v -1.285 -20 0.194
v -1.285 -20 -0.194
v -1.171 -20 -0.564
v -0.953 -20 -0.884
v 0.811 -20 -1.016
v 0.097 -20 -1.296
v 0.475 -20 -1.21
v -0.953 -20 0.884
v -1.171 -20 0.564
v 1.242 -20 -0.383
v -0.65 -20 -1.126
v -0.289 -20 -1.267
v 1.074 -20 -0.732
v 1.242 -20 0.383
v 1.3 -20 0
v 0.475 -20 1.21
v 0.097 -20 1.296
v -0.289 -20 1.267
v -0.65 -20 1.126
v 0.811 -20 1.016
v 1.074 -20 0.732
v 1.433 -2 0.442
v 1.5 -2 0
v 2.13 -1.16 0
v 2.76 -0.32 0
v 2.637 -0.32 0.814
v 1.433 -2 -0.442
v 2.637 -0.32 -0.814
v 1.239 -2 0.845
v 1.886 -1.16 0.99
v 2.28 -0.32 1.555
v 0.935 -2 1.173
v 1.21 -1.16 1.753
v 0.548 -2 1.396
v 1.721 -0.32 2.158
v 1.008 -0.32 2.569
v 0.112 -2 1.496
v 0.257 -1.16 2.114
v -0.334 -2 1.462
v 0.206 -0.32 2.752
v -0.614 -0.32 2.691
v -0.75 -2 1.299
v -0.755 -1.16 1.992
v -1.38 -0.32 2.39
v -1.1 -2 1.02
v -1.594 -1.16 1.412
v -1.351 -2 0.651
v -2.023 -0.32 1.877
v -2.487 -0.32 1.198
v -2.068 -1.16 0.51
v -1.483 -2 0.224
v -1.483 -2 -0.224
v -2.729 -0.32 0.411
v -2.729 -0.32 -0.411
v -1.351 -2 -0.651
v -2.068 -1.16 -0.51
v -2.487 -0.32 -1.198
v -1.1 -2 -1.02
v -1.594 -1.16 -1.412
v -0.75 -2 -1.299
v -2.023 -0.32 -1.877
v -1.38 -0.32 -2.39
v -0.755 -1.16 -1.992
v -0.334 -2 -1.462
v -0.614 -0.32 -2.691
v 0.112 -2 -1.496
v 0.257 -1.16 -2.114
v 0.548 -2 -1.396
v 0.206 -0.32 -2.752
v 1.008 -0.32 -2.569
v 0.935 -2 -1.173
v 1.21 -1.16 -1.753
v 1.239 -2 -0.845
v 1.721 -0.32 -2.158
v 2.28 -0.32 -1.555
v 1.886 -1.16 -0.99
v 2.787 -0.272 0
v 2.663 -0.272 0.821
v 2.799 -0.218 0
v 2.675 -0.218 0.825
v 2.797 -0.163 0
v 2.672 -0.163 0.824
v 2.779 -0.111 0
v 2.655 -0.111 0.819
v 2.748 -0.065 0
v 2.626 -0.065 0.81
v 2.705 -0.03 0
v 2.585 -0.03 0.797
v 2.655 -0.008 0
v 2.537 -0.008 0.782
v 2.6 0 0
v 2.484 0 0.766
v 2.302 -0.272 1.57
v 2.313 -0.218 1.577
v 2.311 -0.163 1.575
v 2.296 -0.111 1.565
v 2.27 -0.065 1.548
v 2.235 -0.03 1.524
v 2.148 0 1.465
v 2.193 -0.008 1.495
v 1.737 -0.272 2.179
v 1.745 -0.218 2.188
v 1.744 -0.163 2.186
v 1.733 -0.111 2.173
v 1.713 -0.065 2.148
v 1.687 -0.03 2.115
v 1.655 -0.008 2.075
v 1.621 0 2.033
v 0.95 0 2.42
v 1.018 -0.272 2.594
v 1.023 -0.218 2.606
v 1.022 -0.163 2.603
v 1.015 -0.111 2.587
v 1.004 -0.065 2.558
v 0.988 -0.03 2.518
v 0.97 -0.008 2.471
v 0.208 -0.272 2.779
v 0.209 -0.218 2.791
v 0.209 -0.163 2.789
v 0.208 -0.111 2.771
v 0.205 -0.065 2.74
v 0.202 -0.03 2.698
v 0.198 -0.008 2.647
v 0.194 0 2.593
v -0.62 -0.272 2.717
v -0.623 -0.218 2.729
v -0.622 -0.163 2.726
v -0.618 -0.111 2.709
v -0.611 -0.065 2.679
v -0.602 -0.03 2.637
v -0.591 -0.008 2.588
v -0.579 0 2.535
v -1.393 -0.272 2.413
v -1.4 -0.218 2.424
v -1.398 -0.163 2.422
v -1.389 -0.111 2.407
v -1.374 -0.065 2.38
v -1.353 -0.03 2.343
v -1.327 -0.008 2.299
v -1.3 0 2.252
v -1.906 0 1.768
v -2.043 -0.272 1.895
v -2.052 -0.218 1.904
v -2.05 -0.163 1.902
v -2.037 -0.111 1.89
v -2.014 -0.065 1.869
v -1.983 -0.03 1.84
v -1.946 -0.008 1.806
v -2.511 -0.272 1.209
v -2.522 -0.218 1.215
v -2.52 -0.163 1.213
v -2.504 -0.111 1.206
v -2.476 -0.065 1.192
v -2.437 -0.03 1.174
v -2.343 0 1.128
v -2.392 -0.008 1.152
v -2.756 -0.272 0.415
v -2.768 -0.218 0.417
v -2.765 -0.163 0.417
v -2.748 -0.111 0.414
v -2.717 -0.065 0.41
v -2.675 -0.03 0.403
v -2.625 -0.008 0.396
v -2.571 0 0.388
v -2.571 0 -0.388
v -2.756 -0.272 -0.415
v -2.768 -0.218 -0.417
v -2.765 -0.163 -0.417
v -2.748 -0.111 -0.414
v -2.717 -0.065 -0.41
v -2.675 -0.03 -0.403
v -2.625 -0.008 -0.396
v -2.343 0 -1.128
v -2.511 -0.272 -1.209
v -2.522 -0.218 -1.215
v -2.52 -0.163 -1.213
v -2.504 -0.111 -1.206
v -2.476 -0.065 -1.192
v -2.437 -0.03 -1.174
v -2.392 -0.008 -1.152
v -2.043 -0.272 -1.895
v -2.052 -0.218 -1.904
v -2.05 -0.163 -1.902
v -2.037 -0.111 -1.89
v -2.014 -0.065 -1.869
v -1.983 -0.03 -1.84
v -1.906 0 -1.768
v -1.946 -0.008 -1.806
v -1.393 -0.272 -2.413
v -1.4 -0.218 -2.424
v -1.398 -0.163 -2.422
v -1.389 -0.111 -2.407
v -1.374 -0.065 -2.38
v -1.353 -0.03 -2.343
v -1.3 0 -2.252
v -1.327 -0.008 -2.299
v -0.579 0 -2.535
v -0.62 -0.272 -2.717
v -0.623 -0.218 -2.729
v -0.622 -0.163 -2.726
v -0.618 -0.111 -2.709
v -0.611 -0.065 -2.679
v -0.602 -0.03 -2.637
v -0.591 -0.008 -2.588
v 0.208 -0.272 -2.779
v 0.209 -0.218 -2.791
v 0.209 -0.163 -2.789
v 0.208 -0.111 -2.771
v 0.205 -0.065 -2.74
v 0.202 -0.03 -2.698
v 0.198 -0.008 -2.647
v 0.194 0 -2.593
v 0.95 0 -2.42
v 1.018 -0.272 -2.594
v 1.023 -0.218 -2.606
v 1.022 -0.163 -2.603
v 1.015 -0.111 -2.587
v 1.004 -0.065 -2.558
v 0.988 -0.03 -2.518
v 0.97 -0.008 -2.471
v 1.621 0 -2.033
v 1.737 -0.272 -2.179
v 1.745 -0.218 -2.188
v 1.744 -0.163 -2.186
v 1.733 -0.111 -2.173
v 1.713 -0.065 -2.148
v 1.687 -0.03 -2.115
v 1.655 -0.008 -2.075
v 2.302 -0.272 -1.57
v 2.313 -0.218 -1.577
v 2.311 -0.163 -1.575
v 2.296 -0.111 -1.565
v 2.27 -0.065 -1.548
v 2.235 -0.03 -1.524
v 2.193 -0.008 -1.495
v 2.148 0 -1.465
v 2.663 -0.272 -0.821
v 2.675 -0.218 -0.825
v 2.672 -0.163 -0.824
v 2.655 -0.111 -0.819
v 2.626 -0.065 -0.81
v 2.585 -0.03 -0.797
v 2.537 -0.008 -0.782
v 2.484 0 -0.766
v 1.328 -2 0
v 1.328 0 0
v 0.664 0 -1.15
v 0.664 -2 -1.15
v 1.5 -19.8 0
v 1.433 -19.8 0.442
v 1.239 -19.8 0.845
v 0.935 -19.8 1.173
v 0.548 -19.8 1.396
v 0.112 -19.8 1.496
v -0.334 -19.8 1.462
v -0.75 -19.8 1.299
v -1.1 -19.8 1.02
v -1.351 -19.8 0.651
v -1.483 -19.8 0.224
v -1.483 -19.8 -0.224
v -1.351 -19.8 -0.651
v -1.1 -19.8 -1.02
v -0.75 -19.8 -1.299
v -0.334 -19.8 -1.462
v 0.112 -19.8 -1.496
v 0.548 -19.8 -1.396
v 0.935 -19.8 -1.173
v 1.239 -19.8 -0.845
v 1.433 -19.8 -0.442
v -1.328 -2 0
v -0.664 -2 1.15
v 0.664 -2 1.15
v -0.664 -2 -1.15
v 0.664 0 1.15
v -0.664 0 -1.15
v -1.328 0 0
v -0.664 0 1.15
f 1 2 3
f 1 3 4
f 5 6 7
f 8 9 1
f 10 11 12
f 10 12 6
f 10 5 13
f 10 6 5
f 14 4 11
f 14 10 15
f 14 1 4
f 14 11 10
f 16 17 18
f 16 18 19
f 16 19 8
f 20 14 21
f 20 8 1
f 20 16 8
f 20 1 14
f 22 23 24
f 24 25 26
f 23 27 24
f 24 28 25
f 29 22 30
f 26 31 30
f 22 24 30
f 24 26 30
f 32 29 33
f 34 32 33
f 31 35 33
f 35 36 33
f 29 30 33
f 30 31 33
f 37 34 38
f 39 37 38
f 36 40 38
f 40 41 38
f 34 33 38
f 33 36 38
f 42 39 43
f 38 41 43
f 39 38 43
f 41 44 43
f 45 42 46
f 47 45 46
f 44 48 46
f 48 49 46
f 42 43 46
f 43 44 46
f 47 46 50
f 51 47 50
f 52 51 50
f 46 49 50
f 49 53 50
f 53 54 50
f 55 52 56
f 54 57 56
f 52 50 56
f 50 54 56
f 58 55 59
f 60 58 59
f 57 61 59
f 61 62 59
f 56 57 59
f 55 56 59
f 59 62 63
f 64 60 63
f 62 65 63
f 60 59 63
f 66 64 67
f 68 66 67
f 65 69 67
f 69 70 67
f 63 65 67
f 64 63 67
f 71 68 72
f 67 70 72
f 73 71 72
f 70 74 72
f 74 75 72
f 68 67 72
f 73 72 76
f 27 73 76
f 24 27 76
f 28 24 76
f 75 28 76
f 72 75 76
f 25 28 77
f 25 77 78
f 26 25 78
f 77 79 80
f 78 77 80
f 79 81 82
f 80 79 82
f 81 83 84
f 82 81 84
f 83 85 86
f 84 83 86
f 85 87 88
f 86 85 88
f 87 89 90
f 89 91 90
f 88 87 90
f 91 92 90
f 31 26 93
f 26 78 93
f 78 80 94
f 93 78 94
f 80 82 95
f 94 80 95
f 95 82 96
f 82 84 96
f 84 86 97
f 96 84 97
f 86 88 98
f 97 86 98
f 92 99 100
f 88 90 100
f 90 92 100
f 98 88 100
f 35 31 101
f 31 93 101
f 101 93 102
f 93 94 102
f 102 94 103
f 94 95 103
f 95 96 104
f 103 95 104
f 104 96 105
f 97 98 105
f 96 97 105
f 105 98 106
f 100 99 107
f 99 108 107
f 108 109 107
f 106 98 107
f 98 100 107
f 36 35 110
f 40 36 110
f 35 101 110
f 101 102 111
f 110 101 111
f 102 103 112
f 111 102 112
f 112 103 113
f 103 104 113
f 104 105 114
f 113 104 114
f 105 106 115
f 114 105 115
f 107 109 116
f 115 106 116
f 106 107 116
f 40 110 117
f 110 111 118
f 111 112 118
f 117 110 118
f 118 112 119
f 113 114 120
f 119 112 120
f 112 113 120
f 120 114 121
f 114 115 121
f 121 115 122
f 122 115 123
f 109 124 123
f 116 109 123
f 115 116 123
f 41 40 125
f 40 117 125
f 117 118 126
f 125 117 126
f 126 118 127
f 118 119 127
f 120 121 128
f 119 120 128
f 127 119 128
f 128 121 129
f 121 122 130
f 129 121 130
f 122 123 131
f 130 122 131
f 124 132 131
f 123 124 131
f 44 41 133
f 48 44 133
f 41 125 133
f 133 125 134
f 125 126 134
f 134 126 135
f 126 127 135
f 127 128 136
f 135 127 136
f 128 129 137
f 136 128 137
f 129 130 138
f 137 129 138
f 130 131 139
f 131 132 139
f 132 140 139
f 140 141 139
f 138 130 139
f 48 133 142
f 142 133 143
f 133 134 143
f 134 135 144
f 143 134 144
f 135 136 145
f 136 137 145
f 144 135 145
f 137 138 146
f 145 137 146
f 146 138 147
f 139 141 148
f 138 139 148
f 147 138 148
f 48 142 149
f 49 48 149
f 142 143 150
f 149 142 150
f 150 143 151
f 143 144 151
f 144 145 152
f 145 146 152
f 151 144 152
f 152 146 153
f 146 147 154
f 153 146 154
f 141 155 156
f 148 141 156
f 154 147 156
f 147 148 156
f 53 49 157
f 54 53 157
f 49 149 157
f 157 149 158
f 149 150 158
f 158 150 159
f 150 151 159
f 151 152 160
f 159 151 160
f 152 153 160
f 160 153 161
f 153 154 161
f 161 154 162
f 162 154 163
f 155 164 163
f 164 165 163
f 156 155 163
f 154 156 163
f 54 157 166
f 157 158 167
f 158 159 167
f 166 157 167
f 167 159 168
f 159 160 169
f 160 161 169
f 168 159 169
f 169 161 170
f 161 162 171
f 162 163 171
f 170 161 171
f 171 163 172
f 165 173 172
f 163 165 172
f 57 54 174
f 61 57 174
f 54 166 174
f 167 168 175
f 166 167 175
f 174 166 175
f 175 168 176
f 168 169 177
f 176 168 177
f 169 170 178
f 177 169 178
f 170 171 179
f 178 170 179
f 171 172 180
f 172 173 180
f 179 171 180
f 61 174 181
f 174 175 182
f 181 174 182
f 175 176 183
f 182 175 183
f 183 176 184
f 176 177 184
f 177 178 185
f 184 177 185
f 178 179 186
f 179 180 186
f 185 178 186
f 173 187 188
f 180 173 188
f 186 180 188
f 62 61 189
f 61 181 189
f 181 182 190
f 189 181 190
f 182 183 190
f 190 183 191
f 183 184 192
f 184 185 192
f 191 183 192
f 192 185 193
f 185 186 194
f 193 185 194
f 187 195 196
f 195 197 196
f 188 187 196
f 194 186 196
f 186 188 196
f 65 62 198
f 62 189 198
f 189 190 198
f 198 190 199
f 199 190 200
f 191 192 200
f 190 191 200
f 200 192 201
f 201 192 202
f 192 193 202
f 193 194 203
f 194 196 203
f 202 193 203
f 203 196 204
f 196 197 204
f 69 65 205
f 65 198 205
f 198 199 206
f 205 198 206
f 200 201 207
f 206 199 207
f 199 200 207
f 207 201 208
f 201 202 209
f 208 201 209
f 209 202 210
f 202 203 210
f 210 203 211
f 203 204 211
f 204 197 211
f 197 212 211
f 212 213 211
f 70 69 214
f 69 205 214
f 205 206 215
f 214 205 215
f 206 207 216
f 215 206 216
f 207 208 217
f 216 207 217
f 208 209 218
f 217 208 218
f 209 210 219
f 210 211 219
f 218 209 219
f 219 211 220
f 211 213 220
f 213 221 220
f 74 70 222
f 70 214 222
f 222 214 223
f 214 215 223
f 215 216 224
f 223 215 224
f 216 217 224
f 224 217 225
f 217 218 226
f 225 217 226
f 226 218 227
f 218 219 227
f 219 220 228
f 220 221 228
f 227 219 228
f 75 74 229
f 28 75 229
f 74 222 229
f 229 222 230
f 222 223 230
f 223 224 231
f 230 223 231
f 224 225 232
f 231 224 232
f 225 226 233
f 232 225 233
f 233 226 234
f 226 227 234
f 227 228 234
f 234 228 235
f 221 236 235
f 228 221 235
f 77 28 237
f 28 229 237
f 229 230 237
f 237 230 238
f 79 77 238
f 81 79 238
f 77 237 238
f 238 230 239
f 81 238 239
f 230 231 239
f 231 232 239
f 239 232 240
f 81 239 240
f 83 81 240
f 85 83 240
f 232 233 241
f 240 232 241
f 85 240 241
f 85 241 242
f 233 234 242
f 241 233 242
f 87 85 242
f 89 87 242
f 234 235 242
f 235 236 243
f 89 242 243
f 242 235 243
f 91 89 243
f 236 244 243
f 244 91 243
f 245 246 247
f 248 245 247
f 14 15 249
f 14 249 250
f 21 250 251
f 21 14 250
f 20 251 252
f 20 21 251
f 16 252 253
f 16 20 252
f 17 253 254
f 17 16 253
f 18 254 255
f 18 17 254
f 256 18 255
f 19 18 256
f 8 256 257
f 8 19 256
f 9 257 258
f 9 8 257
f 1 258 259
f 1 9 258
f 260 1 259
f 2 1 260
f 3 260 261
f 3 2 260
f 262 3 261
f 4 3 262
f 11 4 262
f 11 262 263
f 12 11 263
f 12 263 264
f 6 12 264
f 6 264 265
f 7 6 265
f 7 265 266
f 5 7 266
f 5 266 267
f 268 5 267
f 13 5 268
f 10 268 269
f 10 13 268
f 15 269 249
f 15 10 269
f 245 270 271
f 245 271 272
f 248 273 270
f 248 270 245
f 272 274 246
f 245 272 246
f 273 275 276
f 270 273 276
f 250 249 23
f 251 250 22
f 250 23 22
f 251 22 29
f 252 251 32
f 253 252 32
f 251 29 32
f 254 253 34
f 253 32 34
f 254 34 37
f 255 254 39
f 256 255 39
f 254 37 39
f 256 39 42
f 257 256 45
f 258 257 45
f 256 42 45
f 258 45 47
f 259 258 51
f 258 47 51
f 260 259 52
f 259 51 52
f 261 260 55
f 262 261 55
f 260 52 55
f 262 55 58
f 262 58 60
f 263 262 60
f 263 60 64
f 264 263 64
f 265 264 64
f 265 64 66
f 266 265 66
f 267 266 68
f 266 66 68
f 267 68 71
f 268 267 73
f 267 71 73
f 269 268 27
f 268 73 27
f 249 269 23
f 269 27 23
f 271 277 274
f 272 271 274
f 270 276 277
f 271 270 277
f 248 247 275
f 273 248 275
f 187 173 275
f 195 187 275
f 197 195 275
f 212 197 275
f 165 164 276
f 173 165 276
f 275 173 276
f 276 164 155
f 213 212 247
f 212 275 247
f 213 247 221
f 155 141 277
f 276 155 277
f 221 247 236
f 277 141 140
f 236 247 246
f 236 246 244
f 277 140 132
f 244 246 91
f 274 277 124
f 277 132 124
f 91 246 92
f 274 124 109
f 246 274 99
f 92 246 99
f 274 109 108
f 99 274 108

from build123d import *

# Parameters (mm, degrees)
SKETCH_2_R          = 1.5
EXTRUDE_1_DEPTH     = 18
CUT_EXTRUDE_1_DEPTH = 2
CHAMFER_1_SIZE      = 0.2
FILLET_1_R          = 0.2


with BuildPart() as part:
    # 草图1 → 旋转1 (revolve)
    with BuildSketch(Plane.XY):
        Polygon((0, 0), (0, -2), (1.5, -2), (3, 0), align=None)
    revolve(axis=Axis((0, 0, 0), (0, -1, 0)))

    # 草图2 → 凸台-拉伸1 (add)
    with BuildSketch(Plane.XZ.offset(2)):
        Circle(SKETCH_2_R)
    extrude(amount=EXTRUDE_1_DEPTH)

    # 草图3 → 切除-拉伸1 (cut)
    with BuildSketch(Plane(origin=(0, 0, 0), x_dir=(1, 0, 0), z_dir=(0, 1, 0))):
        Polygon((-1.327905619, 0), (-0.66395281, -1.15), (0.66395281, -1.15), (1.327905619, 0), (0.66395281, 1.15), (-0.66395281, 1.15), align=None)
    extrude(amount=-CUT_EXTRUDE_1_DEPTH, mode=Mode.SUBTRACT)

    # 倒角1
    chamfer_1_edges = [part.edges().sort_by_distance(p)[0] for p in [
        (-1.5, -20, 0),
    ]]
    chamfer(chamfer_1_edges, length=CHAMFER_1_SIZE)

    # 圆角1
    fillet_1_edges = [part.edges().sort_by_distance(p)[0] for p in [
        (-3, 0, 0),
    ]]
    fillet(fillet_1_edges, radius=FILLET_1_R)


solid = part.part
